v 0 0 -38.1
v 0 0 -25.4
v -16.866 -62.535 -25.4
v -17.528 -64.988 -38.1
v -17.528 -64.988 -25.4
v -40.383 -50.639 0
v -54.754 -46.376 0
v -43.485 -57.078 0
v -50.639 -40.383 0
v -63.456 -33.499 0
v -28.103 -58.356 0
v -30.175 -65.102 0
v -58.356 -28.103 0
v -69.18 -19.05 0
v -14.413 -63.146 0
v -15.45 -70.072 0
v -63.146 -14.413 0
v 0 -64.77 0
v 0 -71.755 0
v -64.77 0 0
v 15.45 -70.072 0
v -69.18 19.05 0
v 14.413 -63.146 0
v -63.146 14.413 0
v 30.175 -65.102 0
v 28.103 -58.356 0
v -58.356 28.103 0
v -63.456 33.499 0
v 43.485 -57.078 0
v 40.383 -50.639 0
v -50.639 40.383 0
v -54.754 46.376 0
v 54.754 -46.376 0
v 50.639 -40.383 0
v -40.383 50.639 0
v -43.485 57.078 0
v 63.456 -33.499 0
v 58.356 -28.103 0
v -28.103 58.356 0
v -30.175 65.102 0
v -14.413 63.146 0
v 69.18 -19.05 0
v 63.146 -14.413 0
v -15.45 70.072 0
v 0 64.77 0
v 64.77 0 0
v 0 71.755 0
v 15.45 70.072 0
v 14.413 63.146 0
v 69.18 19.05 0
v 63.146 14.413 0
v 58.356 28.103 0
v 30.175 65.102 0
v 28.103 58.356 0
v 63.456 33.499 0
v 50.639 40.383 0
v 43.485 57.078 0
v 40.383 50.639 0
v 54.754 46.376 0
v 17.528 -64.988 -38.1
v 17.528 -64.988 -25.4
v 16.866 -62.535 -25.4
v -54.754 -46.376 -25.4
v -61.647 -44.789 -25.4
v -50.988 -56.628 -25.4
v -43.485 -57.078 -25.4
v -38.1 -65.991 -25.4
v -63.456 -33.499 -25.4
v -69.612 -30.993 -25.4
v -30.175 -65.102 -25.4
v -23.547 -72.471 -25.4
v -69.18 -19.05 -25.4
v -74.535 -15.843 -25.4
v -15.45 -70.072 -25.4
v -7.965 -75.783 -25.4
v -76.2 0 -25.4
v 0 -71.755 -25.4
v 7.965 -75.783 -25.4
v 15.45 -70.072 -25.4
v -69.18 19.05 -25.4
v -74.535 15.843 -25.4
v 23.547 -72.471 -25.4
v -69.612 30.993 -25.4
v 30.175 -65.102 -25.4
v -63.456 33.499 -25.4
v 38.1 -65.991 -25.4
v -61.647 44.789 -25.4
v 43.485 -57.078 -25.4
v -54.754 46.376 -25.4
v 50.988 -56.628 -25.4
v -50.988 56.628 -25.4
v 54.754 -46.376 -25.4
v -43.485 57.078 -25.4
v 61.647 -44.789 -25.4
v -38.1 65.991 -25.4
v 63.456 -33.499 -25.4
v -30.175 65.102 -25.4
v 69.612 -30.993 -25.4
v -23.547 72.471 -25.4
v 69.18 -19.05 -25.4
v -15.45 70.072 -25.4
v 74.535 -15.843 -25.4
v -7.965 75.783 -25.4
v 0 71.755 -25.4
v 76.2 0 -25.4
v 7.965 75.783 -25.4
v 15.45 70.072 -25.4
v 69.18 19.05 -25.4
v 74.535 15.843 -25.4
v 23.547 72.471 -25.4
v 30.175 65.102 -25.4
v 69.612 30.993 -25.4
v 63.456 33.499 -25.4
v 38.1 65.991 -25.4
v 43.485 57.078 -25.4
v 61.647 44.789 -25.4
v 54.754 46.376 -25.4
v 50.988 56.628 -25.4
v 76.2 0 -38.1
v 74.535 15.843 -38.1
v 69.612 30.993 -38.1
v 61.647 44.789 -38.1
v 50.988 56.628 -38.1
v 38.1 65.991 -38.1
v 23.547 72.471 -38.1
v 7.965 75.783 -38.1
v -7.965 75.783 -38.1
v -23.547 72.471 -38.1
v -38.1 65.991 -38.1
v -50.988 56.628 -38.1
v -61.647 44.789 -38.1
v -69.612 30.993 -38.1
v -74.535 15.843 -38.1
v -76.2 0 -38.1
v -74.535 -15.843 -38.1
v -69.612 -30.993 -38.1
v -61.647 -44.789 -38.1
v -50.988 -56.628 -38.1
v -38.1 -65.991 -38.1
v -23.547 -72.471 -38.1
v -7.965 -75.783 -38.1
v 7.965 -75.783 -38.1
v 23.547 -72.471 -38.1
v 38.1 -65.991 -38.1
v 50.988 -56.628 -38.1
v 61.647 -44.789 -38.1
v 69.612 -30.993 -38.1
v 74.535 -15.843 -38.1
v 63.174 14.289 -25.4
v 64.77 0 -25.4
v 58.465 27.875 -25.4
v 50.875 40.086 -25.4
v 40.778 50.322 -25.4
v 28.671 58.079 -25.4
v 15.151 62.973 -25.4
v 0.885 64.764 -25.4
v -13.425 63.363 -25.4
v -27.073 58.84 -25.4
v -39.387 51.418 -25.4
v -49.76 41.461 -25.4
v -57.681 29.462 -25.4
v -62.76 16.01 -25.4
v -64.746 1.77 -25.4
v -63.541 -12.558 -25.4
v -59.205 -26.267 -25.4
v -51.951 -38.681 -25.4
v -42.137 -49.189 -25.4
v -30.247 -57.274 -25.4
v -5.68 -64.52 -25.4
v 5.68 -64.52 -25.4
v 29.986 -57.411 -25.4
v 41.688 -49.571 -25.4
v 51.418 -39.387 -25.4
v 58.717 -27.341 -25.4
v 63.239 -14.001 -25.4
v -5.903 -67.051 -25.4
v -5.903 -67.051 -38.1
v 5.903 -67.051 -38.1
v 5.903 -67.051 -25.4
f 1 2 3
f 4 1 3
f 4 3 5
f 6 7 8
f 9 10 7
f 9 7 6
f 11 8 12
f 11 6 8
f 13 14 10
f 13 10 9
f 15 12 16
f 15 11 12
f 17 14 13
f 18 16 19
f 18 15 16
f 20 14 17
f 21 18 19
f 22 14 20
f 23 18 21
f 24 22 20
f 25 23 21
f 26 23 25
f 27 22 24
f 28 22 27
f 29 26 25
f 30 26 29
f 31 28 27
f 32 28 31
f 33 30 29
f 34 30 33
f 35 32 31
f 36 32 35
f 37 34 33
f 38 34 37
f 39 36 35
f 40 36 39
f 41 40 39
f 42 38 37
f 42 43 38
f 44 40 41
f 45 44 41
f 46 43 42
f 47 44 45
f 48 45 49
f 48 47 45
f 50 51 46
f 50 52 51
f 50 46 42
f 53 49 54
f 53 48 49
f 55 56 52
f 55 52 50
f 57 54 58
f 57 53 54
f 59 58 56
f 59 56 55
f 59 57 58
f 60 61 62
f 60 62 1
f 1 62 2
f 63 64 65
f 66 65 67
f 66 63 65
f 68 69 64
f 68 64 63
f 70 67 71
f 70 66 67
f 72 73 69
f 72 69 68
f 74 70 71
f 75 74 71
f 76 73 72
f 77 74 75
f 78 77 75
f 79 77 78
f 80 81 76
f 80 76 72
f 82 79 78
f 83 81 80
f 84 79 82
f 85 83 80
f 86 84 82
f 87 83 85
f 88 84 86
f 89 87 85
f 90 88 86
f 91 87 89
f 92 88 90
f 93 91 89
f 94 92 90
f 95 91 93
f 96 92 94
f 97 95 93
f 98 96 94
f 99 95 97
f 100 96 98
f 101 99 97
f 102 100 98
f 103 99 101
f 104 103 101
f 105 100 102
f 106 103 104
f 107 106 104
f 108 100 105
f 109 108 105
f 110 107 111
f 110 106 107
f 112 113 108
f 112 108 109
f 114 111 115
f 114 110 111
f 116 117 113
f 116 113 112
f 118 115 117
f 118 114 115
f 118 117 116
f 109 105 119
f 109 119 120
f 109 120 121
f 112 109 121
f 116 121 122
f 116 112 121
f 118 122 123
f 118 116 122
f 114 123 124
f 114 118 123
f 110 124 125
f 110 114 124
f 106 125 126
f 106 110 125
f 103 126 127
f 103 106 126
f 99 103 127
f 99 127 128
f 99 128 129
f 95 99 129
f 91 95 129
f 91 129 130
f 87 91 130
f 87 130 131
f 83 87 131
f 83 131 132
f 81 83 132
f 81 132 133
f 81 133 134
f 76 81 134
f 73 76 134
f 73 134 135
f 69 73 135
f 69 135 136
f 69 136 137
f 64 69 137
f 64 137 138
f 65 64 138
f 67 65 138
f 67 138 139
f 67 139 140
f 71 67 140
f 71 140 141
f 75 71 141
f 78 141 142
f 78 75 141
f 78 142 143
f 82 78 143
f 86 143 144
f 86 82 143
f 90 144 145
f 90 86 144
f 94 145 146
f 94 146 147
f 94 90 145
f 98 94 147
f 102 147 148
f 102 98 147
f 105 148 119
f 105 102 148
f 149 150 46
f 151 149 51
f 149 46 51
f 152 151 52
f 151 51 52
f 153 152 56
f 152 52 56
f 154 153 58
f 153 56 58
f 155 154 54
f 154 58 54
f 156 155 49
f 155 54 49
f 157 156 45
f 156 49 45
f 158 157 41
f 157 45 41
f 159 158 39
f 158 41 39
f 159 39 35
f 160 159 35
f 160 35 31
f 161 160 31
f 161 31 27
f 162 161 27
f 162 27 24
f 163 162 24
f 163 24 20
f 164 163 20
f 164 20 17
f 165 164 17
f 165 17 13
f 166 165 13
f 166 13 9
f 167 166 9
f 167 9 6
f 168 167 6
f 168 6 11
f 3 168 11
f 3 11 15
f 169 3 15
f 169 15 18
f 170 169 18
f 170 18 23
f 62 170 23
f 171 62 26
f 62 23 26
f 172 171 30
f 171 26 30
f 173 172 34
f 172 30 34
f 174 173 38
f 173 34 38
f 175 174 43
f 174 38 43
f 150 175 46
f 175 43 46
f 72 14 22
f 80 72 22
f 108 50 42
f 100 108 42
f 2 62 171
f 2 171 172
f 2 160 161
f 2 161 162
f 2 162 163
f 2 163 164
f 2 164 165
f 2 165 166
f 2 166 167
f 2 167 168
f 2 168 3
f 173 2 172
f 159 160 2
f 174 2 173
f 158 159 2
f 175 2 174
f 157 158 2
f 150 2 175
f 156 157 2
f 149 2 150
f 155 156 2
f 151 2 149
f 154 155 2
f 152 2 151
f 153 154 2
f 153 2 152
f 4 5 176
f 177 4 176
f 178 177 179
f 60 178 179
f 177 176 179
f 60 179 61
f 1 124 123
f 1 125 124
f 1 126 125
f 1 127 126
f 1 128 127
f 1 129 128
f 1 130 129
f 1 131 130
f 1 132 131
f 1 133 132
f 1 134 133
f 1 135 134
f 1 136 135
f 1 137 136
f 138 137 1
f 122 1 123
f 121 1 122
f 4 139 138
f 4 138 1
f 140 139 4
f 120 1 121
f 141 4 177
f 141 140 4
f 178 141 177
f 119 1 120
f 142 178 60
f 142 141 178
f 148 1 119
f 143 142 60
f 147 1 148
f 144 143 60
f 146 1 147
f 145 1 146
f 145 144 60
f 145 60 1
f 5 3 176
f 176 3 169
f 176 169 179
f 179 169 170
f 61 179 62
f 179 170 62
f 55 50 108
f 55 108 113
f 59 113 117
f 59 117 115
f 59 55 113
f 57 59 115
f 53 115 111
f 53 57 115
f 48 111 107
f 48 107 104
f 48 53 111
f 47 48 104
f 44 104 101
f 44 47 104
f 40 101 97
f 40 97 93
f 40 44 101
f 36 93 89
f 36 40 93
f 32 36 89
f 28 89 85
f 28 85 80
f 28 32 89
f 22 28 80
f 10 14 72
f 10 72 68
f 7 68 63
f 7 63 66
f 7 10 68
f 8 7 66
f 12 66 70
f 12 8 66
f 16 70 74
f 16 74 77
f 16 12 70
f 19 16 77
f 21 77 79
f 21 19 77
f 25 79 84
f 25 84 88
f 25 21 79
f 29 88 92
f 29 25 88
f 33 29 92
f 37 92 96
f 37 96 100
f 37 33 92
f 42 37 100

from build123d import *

# Parameters (mm, degrees)
F0_R      = 76.2
F1_DEPTH  = 88.9
F2_R      = 76.2
F2_R_2    = 71.755
F3_DEPTH  = 25.4
F4_R      = 64.77
F5_DEPTH  = 25.4
F11_DEPTH = 63.501
F13_DEPTH = 25.4
F14_R     = 106.3100734062
F15_DEPTH = 50.8


with BuildPart() as f1:
    # F0 (on Top) → F1 (new body)
    with BuildSketch(Plane.XY):
        Circle(F0_R)
    extrude(amount=-F1_DEPTH)

    # F2 (on face) → F3 (cut)
    with BuildSketch(Plane.XY):
        Circle(F2_R)
        Circle(F2_R_2, mode=Mode.SUBTRACT)
    extrude(amount=-F3_DEPTH, mode=Mode.SUBTRACT)

    # F4 (on face) → F5 (cut)
    with BuildSketch(Plane.XY):
        Circle(F4_R)
    extrude(amount=-F5_DEPTH, mode=Mode.SUBTRACT)

    # F7 (on offset) → F11 (cut, through all)
    with BuildSketch(Plane.XY.offset(-25.4)):
        with BuildLine():
            Line((17.5278273627, -64.9877786045), (0, 0))
            Line((0, 0), (-17.5278273627, -64.9877786045))
            ThreePointArc((-17.5278273627, -64.9877786045), (0, -67.31), (17.5278273627, -64.9877786045))
        make_face()
    extrude(amount=-F11_DEPTH, mode=Mode.SUBTRACT)

    # F12 (on face) → F13 (cut)
    with BuildSketch(Plane.XY):
        with BuildLine():
            Line((-69.180037041, 0), (-69.180037041, 19.05))
            ThreePointArc((-69.180037041, 19.05), (-71.755, 0), (-69.180037041, -19.05))
            Line((-69.180037041, -19.05), (-69.180037041, 0))
        make_face()
        with BuildLine():
            ThreePointArc((71.755, 0), (71.1083454416, 9.6116197157), (69.180037041, 19.05))
            Line((69.180037041, 19.05), (69.180037041, 0))
            Line((69.180037041, 0), (69.180037041, -19.05))
            ThreePointArc((69.180037041, -19.05), (71.1083454416, -9.6116197157), (71.755, 0))
        make_face()
    extrude(amount=-F13_DEPTH, mode=Mode.SUBTRACT)

    # F14 (on face) → F15 (cut)
    with BuildSketch(Plane(origin=(0, 0, -88.9), x_dir=(1, 0, 0), z_dir=(0, 0, -1))):
        Circle(F14_R)
    extrude(amount=-F15_DEPTH, mode=Mode.SUBTRACT)


solid = f1.part
